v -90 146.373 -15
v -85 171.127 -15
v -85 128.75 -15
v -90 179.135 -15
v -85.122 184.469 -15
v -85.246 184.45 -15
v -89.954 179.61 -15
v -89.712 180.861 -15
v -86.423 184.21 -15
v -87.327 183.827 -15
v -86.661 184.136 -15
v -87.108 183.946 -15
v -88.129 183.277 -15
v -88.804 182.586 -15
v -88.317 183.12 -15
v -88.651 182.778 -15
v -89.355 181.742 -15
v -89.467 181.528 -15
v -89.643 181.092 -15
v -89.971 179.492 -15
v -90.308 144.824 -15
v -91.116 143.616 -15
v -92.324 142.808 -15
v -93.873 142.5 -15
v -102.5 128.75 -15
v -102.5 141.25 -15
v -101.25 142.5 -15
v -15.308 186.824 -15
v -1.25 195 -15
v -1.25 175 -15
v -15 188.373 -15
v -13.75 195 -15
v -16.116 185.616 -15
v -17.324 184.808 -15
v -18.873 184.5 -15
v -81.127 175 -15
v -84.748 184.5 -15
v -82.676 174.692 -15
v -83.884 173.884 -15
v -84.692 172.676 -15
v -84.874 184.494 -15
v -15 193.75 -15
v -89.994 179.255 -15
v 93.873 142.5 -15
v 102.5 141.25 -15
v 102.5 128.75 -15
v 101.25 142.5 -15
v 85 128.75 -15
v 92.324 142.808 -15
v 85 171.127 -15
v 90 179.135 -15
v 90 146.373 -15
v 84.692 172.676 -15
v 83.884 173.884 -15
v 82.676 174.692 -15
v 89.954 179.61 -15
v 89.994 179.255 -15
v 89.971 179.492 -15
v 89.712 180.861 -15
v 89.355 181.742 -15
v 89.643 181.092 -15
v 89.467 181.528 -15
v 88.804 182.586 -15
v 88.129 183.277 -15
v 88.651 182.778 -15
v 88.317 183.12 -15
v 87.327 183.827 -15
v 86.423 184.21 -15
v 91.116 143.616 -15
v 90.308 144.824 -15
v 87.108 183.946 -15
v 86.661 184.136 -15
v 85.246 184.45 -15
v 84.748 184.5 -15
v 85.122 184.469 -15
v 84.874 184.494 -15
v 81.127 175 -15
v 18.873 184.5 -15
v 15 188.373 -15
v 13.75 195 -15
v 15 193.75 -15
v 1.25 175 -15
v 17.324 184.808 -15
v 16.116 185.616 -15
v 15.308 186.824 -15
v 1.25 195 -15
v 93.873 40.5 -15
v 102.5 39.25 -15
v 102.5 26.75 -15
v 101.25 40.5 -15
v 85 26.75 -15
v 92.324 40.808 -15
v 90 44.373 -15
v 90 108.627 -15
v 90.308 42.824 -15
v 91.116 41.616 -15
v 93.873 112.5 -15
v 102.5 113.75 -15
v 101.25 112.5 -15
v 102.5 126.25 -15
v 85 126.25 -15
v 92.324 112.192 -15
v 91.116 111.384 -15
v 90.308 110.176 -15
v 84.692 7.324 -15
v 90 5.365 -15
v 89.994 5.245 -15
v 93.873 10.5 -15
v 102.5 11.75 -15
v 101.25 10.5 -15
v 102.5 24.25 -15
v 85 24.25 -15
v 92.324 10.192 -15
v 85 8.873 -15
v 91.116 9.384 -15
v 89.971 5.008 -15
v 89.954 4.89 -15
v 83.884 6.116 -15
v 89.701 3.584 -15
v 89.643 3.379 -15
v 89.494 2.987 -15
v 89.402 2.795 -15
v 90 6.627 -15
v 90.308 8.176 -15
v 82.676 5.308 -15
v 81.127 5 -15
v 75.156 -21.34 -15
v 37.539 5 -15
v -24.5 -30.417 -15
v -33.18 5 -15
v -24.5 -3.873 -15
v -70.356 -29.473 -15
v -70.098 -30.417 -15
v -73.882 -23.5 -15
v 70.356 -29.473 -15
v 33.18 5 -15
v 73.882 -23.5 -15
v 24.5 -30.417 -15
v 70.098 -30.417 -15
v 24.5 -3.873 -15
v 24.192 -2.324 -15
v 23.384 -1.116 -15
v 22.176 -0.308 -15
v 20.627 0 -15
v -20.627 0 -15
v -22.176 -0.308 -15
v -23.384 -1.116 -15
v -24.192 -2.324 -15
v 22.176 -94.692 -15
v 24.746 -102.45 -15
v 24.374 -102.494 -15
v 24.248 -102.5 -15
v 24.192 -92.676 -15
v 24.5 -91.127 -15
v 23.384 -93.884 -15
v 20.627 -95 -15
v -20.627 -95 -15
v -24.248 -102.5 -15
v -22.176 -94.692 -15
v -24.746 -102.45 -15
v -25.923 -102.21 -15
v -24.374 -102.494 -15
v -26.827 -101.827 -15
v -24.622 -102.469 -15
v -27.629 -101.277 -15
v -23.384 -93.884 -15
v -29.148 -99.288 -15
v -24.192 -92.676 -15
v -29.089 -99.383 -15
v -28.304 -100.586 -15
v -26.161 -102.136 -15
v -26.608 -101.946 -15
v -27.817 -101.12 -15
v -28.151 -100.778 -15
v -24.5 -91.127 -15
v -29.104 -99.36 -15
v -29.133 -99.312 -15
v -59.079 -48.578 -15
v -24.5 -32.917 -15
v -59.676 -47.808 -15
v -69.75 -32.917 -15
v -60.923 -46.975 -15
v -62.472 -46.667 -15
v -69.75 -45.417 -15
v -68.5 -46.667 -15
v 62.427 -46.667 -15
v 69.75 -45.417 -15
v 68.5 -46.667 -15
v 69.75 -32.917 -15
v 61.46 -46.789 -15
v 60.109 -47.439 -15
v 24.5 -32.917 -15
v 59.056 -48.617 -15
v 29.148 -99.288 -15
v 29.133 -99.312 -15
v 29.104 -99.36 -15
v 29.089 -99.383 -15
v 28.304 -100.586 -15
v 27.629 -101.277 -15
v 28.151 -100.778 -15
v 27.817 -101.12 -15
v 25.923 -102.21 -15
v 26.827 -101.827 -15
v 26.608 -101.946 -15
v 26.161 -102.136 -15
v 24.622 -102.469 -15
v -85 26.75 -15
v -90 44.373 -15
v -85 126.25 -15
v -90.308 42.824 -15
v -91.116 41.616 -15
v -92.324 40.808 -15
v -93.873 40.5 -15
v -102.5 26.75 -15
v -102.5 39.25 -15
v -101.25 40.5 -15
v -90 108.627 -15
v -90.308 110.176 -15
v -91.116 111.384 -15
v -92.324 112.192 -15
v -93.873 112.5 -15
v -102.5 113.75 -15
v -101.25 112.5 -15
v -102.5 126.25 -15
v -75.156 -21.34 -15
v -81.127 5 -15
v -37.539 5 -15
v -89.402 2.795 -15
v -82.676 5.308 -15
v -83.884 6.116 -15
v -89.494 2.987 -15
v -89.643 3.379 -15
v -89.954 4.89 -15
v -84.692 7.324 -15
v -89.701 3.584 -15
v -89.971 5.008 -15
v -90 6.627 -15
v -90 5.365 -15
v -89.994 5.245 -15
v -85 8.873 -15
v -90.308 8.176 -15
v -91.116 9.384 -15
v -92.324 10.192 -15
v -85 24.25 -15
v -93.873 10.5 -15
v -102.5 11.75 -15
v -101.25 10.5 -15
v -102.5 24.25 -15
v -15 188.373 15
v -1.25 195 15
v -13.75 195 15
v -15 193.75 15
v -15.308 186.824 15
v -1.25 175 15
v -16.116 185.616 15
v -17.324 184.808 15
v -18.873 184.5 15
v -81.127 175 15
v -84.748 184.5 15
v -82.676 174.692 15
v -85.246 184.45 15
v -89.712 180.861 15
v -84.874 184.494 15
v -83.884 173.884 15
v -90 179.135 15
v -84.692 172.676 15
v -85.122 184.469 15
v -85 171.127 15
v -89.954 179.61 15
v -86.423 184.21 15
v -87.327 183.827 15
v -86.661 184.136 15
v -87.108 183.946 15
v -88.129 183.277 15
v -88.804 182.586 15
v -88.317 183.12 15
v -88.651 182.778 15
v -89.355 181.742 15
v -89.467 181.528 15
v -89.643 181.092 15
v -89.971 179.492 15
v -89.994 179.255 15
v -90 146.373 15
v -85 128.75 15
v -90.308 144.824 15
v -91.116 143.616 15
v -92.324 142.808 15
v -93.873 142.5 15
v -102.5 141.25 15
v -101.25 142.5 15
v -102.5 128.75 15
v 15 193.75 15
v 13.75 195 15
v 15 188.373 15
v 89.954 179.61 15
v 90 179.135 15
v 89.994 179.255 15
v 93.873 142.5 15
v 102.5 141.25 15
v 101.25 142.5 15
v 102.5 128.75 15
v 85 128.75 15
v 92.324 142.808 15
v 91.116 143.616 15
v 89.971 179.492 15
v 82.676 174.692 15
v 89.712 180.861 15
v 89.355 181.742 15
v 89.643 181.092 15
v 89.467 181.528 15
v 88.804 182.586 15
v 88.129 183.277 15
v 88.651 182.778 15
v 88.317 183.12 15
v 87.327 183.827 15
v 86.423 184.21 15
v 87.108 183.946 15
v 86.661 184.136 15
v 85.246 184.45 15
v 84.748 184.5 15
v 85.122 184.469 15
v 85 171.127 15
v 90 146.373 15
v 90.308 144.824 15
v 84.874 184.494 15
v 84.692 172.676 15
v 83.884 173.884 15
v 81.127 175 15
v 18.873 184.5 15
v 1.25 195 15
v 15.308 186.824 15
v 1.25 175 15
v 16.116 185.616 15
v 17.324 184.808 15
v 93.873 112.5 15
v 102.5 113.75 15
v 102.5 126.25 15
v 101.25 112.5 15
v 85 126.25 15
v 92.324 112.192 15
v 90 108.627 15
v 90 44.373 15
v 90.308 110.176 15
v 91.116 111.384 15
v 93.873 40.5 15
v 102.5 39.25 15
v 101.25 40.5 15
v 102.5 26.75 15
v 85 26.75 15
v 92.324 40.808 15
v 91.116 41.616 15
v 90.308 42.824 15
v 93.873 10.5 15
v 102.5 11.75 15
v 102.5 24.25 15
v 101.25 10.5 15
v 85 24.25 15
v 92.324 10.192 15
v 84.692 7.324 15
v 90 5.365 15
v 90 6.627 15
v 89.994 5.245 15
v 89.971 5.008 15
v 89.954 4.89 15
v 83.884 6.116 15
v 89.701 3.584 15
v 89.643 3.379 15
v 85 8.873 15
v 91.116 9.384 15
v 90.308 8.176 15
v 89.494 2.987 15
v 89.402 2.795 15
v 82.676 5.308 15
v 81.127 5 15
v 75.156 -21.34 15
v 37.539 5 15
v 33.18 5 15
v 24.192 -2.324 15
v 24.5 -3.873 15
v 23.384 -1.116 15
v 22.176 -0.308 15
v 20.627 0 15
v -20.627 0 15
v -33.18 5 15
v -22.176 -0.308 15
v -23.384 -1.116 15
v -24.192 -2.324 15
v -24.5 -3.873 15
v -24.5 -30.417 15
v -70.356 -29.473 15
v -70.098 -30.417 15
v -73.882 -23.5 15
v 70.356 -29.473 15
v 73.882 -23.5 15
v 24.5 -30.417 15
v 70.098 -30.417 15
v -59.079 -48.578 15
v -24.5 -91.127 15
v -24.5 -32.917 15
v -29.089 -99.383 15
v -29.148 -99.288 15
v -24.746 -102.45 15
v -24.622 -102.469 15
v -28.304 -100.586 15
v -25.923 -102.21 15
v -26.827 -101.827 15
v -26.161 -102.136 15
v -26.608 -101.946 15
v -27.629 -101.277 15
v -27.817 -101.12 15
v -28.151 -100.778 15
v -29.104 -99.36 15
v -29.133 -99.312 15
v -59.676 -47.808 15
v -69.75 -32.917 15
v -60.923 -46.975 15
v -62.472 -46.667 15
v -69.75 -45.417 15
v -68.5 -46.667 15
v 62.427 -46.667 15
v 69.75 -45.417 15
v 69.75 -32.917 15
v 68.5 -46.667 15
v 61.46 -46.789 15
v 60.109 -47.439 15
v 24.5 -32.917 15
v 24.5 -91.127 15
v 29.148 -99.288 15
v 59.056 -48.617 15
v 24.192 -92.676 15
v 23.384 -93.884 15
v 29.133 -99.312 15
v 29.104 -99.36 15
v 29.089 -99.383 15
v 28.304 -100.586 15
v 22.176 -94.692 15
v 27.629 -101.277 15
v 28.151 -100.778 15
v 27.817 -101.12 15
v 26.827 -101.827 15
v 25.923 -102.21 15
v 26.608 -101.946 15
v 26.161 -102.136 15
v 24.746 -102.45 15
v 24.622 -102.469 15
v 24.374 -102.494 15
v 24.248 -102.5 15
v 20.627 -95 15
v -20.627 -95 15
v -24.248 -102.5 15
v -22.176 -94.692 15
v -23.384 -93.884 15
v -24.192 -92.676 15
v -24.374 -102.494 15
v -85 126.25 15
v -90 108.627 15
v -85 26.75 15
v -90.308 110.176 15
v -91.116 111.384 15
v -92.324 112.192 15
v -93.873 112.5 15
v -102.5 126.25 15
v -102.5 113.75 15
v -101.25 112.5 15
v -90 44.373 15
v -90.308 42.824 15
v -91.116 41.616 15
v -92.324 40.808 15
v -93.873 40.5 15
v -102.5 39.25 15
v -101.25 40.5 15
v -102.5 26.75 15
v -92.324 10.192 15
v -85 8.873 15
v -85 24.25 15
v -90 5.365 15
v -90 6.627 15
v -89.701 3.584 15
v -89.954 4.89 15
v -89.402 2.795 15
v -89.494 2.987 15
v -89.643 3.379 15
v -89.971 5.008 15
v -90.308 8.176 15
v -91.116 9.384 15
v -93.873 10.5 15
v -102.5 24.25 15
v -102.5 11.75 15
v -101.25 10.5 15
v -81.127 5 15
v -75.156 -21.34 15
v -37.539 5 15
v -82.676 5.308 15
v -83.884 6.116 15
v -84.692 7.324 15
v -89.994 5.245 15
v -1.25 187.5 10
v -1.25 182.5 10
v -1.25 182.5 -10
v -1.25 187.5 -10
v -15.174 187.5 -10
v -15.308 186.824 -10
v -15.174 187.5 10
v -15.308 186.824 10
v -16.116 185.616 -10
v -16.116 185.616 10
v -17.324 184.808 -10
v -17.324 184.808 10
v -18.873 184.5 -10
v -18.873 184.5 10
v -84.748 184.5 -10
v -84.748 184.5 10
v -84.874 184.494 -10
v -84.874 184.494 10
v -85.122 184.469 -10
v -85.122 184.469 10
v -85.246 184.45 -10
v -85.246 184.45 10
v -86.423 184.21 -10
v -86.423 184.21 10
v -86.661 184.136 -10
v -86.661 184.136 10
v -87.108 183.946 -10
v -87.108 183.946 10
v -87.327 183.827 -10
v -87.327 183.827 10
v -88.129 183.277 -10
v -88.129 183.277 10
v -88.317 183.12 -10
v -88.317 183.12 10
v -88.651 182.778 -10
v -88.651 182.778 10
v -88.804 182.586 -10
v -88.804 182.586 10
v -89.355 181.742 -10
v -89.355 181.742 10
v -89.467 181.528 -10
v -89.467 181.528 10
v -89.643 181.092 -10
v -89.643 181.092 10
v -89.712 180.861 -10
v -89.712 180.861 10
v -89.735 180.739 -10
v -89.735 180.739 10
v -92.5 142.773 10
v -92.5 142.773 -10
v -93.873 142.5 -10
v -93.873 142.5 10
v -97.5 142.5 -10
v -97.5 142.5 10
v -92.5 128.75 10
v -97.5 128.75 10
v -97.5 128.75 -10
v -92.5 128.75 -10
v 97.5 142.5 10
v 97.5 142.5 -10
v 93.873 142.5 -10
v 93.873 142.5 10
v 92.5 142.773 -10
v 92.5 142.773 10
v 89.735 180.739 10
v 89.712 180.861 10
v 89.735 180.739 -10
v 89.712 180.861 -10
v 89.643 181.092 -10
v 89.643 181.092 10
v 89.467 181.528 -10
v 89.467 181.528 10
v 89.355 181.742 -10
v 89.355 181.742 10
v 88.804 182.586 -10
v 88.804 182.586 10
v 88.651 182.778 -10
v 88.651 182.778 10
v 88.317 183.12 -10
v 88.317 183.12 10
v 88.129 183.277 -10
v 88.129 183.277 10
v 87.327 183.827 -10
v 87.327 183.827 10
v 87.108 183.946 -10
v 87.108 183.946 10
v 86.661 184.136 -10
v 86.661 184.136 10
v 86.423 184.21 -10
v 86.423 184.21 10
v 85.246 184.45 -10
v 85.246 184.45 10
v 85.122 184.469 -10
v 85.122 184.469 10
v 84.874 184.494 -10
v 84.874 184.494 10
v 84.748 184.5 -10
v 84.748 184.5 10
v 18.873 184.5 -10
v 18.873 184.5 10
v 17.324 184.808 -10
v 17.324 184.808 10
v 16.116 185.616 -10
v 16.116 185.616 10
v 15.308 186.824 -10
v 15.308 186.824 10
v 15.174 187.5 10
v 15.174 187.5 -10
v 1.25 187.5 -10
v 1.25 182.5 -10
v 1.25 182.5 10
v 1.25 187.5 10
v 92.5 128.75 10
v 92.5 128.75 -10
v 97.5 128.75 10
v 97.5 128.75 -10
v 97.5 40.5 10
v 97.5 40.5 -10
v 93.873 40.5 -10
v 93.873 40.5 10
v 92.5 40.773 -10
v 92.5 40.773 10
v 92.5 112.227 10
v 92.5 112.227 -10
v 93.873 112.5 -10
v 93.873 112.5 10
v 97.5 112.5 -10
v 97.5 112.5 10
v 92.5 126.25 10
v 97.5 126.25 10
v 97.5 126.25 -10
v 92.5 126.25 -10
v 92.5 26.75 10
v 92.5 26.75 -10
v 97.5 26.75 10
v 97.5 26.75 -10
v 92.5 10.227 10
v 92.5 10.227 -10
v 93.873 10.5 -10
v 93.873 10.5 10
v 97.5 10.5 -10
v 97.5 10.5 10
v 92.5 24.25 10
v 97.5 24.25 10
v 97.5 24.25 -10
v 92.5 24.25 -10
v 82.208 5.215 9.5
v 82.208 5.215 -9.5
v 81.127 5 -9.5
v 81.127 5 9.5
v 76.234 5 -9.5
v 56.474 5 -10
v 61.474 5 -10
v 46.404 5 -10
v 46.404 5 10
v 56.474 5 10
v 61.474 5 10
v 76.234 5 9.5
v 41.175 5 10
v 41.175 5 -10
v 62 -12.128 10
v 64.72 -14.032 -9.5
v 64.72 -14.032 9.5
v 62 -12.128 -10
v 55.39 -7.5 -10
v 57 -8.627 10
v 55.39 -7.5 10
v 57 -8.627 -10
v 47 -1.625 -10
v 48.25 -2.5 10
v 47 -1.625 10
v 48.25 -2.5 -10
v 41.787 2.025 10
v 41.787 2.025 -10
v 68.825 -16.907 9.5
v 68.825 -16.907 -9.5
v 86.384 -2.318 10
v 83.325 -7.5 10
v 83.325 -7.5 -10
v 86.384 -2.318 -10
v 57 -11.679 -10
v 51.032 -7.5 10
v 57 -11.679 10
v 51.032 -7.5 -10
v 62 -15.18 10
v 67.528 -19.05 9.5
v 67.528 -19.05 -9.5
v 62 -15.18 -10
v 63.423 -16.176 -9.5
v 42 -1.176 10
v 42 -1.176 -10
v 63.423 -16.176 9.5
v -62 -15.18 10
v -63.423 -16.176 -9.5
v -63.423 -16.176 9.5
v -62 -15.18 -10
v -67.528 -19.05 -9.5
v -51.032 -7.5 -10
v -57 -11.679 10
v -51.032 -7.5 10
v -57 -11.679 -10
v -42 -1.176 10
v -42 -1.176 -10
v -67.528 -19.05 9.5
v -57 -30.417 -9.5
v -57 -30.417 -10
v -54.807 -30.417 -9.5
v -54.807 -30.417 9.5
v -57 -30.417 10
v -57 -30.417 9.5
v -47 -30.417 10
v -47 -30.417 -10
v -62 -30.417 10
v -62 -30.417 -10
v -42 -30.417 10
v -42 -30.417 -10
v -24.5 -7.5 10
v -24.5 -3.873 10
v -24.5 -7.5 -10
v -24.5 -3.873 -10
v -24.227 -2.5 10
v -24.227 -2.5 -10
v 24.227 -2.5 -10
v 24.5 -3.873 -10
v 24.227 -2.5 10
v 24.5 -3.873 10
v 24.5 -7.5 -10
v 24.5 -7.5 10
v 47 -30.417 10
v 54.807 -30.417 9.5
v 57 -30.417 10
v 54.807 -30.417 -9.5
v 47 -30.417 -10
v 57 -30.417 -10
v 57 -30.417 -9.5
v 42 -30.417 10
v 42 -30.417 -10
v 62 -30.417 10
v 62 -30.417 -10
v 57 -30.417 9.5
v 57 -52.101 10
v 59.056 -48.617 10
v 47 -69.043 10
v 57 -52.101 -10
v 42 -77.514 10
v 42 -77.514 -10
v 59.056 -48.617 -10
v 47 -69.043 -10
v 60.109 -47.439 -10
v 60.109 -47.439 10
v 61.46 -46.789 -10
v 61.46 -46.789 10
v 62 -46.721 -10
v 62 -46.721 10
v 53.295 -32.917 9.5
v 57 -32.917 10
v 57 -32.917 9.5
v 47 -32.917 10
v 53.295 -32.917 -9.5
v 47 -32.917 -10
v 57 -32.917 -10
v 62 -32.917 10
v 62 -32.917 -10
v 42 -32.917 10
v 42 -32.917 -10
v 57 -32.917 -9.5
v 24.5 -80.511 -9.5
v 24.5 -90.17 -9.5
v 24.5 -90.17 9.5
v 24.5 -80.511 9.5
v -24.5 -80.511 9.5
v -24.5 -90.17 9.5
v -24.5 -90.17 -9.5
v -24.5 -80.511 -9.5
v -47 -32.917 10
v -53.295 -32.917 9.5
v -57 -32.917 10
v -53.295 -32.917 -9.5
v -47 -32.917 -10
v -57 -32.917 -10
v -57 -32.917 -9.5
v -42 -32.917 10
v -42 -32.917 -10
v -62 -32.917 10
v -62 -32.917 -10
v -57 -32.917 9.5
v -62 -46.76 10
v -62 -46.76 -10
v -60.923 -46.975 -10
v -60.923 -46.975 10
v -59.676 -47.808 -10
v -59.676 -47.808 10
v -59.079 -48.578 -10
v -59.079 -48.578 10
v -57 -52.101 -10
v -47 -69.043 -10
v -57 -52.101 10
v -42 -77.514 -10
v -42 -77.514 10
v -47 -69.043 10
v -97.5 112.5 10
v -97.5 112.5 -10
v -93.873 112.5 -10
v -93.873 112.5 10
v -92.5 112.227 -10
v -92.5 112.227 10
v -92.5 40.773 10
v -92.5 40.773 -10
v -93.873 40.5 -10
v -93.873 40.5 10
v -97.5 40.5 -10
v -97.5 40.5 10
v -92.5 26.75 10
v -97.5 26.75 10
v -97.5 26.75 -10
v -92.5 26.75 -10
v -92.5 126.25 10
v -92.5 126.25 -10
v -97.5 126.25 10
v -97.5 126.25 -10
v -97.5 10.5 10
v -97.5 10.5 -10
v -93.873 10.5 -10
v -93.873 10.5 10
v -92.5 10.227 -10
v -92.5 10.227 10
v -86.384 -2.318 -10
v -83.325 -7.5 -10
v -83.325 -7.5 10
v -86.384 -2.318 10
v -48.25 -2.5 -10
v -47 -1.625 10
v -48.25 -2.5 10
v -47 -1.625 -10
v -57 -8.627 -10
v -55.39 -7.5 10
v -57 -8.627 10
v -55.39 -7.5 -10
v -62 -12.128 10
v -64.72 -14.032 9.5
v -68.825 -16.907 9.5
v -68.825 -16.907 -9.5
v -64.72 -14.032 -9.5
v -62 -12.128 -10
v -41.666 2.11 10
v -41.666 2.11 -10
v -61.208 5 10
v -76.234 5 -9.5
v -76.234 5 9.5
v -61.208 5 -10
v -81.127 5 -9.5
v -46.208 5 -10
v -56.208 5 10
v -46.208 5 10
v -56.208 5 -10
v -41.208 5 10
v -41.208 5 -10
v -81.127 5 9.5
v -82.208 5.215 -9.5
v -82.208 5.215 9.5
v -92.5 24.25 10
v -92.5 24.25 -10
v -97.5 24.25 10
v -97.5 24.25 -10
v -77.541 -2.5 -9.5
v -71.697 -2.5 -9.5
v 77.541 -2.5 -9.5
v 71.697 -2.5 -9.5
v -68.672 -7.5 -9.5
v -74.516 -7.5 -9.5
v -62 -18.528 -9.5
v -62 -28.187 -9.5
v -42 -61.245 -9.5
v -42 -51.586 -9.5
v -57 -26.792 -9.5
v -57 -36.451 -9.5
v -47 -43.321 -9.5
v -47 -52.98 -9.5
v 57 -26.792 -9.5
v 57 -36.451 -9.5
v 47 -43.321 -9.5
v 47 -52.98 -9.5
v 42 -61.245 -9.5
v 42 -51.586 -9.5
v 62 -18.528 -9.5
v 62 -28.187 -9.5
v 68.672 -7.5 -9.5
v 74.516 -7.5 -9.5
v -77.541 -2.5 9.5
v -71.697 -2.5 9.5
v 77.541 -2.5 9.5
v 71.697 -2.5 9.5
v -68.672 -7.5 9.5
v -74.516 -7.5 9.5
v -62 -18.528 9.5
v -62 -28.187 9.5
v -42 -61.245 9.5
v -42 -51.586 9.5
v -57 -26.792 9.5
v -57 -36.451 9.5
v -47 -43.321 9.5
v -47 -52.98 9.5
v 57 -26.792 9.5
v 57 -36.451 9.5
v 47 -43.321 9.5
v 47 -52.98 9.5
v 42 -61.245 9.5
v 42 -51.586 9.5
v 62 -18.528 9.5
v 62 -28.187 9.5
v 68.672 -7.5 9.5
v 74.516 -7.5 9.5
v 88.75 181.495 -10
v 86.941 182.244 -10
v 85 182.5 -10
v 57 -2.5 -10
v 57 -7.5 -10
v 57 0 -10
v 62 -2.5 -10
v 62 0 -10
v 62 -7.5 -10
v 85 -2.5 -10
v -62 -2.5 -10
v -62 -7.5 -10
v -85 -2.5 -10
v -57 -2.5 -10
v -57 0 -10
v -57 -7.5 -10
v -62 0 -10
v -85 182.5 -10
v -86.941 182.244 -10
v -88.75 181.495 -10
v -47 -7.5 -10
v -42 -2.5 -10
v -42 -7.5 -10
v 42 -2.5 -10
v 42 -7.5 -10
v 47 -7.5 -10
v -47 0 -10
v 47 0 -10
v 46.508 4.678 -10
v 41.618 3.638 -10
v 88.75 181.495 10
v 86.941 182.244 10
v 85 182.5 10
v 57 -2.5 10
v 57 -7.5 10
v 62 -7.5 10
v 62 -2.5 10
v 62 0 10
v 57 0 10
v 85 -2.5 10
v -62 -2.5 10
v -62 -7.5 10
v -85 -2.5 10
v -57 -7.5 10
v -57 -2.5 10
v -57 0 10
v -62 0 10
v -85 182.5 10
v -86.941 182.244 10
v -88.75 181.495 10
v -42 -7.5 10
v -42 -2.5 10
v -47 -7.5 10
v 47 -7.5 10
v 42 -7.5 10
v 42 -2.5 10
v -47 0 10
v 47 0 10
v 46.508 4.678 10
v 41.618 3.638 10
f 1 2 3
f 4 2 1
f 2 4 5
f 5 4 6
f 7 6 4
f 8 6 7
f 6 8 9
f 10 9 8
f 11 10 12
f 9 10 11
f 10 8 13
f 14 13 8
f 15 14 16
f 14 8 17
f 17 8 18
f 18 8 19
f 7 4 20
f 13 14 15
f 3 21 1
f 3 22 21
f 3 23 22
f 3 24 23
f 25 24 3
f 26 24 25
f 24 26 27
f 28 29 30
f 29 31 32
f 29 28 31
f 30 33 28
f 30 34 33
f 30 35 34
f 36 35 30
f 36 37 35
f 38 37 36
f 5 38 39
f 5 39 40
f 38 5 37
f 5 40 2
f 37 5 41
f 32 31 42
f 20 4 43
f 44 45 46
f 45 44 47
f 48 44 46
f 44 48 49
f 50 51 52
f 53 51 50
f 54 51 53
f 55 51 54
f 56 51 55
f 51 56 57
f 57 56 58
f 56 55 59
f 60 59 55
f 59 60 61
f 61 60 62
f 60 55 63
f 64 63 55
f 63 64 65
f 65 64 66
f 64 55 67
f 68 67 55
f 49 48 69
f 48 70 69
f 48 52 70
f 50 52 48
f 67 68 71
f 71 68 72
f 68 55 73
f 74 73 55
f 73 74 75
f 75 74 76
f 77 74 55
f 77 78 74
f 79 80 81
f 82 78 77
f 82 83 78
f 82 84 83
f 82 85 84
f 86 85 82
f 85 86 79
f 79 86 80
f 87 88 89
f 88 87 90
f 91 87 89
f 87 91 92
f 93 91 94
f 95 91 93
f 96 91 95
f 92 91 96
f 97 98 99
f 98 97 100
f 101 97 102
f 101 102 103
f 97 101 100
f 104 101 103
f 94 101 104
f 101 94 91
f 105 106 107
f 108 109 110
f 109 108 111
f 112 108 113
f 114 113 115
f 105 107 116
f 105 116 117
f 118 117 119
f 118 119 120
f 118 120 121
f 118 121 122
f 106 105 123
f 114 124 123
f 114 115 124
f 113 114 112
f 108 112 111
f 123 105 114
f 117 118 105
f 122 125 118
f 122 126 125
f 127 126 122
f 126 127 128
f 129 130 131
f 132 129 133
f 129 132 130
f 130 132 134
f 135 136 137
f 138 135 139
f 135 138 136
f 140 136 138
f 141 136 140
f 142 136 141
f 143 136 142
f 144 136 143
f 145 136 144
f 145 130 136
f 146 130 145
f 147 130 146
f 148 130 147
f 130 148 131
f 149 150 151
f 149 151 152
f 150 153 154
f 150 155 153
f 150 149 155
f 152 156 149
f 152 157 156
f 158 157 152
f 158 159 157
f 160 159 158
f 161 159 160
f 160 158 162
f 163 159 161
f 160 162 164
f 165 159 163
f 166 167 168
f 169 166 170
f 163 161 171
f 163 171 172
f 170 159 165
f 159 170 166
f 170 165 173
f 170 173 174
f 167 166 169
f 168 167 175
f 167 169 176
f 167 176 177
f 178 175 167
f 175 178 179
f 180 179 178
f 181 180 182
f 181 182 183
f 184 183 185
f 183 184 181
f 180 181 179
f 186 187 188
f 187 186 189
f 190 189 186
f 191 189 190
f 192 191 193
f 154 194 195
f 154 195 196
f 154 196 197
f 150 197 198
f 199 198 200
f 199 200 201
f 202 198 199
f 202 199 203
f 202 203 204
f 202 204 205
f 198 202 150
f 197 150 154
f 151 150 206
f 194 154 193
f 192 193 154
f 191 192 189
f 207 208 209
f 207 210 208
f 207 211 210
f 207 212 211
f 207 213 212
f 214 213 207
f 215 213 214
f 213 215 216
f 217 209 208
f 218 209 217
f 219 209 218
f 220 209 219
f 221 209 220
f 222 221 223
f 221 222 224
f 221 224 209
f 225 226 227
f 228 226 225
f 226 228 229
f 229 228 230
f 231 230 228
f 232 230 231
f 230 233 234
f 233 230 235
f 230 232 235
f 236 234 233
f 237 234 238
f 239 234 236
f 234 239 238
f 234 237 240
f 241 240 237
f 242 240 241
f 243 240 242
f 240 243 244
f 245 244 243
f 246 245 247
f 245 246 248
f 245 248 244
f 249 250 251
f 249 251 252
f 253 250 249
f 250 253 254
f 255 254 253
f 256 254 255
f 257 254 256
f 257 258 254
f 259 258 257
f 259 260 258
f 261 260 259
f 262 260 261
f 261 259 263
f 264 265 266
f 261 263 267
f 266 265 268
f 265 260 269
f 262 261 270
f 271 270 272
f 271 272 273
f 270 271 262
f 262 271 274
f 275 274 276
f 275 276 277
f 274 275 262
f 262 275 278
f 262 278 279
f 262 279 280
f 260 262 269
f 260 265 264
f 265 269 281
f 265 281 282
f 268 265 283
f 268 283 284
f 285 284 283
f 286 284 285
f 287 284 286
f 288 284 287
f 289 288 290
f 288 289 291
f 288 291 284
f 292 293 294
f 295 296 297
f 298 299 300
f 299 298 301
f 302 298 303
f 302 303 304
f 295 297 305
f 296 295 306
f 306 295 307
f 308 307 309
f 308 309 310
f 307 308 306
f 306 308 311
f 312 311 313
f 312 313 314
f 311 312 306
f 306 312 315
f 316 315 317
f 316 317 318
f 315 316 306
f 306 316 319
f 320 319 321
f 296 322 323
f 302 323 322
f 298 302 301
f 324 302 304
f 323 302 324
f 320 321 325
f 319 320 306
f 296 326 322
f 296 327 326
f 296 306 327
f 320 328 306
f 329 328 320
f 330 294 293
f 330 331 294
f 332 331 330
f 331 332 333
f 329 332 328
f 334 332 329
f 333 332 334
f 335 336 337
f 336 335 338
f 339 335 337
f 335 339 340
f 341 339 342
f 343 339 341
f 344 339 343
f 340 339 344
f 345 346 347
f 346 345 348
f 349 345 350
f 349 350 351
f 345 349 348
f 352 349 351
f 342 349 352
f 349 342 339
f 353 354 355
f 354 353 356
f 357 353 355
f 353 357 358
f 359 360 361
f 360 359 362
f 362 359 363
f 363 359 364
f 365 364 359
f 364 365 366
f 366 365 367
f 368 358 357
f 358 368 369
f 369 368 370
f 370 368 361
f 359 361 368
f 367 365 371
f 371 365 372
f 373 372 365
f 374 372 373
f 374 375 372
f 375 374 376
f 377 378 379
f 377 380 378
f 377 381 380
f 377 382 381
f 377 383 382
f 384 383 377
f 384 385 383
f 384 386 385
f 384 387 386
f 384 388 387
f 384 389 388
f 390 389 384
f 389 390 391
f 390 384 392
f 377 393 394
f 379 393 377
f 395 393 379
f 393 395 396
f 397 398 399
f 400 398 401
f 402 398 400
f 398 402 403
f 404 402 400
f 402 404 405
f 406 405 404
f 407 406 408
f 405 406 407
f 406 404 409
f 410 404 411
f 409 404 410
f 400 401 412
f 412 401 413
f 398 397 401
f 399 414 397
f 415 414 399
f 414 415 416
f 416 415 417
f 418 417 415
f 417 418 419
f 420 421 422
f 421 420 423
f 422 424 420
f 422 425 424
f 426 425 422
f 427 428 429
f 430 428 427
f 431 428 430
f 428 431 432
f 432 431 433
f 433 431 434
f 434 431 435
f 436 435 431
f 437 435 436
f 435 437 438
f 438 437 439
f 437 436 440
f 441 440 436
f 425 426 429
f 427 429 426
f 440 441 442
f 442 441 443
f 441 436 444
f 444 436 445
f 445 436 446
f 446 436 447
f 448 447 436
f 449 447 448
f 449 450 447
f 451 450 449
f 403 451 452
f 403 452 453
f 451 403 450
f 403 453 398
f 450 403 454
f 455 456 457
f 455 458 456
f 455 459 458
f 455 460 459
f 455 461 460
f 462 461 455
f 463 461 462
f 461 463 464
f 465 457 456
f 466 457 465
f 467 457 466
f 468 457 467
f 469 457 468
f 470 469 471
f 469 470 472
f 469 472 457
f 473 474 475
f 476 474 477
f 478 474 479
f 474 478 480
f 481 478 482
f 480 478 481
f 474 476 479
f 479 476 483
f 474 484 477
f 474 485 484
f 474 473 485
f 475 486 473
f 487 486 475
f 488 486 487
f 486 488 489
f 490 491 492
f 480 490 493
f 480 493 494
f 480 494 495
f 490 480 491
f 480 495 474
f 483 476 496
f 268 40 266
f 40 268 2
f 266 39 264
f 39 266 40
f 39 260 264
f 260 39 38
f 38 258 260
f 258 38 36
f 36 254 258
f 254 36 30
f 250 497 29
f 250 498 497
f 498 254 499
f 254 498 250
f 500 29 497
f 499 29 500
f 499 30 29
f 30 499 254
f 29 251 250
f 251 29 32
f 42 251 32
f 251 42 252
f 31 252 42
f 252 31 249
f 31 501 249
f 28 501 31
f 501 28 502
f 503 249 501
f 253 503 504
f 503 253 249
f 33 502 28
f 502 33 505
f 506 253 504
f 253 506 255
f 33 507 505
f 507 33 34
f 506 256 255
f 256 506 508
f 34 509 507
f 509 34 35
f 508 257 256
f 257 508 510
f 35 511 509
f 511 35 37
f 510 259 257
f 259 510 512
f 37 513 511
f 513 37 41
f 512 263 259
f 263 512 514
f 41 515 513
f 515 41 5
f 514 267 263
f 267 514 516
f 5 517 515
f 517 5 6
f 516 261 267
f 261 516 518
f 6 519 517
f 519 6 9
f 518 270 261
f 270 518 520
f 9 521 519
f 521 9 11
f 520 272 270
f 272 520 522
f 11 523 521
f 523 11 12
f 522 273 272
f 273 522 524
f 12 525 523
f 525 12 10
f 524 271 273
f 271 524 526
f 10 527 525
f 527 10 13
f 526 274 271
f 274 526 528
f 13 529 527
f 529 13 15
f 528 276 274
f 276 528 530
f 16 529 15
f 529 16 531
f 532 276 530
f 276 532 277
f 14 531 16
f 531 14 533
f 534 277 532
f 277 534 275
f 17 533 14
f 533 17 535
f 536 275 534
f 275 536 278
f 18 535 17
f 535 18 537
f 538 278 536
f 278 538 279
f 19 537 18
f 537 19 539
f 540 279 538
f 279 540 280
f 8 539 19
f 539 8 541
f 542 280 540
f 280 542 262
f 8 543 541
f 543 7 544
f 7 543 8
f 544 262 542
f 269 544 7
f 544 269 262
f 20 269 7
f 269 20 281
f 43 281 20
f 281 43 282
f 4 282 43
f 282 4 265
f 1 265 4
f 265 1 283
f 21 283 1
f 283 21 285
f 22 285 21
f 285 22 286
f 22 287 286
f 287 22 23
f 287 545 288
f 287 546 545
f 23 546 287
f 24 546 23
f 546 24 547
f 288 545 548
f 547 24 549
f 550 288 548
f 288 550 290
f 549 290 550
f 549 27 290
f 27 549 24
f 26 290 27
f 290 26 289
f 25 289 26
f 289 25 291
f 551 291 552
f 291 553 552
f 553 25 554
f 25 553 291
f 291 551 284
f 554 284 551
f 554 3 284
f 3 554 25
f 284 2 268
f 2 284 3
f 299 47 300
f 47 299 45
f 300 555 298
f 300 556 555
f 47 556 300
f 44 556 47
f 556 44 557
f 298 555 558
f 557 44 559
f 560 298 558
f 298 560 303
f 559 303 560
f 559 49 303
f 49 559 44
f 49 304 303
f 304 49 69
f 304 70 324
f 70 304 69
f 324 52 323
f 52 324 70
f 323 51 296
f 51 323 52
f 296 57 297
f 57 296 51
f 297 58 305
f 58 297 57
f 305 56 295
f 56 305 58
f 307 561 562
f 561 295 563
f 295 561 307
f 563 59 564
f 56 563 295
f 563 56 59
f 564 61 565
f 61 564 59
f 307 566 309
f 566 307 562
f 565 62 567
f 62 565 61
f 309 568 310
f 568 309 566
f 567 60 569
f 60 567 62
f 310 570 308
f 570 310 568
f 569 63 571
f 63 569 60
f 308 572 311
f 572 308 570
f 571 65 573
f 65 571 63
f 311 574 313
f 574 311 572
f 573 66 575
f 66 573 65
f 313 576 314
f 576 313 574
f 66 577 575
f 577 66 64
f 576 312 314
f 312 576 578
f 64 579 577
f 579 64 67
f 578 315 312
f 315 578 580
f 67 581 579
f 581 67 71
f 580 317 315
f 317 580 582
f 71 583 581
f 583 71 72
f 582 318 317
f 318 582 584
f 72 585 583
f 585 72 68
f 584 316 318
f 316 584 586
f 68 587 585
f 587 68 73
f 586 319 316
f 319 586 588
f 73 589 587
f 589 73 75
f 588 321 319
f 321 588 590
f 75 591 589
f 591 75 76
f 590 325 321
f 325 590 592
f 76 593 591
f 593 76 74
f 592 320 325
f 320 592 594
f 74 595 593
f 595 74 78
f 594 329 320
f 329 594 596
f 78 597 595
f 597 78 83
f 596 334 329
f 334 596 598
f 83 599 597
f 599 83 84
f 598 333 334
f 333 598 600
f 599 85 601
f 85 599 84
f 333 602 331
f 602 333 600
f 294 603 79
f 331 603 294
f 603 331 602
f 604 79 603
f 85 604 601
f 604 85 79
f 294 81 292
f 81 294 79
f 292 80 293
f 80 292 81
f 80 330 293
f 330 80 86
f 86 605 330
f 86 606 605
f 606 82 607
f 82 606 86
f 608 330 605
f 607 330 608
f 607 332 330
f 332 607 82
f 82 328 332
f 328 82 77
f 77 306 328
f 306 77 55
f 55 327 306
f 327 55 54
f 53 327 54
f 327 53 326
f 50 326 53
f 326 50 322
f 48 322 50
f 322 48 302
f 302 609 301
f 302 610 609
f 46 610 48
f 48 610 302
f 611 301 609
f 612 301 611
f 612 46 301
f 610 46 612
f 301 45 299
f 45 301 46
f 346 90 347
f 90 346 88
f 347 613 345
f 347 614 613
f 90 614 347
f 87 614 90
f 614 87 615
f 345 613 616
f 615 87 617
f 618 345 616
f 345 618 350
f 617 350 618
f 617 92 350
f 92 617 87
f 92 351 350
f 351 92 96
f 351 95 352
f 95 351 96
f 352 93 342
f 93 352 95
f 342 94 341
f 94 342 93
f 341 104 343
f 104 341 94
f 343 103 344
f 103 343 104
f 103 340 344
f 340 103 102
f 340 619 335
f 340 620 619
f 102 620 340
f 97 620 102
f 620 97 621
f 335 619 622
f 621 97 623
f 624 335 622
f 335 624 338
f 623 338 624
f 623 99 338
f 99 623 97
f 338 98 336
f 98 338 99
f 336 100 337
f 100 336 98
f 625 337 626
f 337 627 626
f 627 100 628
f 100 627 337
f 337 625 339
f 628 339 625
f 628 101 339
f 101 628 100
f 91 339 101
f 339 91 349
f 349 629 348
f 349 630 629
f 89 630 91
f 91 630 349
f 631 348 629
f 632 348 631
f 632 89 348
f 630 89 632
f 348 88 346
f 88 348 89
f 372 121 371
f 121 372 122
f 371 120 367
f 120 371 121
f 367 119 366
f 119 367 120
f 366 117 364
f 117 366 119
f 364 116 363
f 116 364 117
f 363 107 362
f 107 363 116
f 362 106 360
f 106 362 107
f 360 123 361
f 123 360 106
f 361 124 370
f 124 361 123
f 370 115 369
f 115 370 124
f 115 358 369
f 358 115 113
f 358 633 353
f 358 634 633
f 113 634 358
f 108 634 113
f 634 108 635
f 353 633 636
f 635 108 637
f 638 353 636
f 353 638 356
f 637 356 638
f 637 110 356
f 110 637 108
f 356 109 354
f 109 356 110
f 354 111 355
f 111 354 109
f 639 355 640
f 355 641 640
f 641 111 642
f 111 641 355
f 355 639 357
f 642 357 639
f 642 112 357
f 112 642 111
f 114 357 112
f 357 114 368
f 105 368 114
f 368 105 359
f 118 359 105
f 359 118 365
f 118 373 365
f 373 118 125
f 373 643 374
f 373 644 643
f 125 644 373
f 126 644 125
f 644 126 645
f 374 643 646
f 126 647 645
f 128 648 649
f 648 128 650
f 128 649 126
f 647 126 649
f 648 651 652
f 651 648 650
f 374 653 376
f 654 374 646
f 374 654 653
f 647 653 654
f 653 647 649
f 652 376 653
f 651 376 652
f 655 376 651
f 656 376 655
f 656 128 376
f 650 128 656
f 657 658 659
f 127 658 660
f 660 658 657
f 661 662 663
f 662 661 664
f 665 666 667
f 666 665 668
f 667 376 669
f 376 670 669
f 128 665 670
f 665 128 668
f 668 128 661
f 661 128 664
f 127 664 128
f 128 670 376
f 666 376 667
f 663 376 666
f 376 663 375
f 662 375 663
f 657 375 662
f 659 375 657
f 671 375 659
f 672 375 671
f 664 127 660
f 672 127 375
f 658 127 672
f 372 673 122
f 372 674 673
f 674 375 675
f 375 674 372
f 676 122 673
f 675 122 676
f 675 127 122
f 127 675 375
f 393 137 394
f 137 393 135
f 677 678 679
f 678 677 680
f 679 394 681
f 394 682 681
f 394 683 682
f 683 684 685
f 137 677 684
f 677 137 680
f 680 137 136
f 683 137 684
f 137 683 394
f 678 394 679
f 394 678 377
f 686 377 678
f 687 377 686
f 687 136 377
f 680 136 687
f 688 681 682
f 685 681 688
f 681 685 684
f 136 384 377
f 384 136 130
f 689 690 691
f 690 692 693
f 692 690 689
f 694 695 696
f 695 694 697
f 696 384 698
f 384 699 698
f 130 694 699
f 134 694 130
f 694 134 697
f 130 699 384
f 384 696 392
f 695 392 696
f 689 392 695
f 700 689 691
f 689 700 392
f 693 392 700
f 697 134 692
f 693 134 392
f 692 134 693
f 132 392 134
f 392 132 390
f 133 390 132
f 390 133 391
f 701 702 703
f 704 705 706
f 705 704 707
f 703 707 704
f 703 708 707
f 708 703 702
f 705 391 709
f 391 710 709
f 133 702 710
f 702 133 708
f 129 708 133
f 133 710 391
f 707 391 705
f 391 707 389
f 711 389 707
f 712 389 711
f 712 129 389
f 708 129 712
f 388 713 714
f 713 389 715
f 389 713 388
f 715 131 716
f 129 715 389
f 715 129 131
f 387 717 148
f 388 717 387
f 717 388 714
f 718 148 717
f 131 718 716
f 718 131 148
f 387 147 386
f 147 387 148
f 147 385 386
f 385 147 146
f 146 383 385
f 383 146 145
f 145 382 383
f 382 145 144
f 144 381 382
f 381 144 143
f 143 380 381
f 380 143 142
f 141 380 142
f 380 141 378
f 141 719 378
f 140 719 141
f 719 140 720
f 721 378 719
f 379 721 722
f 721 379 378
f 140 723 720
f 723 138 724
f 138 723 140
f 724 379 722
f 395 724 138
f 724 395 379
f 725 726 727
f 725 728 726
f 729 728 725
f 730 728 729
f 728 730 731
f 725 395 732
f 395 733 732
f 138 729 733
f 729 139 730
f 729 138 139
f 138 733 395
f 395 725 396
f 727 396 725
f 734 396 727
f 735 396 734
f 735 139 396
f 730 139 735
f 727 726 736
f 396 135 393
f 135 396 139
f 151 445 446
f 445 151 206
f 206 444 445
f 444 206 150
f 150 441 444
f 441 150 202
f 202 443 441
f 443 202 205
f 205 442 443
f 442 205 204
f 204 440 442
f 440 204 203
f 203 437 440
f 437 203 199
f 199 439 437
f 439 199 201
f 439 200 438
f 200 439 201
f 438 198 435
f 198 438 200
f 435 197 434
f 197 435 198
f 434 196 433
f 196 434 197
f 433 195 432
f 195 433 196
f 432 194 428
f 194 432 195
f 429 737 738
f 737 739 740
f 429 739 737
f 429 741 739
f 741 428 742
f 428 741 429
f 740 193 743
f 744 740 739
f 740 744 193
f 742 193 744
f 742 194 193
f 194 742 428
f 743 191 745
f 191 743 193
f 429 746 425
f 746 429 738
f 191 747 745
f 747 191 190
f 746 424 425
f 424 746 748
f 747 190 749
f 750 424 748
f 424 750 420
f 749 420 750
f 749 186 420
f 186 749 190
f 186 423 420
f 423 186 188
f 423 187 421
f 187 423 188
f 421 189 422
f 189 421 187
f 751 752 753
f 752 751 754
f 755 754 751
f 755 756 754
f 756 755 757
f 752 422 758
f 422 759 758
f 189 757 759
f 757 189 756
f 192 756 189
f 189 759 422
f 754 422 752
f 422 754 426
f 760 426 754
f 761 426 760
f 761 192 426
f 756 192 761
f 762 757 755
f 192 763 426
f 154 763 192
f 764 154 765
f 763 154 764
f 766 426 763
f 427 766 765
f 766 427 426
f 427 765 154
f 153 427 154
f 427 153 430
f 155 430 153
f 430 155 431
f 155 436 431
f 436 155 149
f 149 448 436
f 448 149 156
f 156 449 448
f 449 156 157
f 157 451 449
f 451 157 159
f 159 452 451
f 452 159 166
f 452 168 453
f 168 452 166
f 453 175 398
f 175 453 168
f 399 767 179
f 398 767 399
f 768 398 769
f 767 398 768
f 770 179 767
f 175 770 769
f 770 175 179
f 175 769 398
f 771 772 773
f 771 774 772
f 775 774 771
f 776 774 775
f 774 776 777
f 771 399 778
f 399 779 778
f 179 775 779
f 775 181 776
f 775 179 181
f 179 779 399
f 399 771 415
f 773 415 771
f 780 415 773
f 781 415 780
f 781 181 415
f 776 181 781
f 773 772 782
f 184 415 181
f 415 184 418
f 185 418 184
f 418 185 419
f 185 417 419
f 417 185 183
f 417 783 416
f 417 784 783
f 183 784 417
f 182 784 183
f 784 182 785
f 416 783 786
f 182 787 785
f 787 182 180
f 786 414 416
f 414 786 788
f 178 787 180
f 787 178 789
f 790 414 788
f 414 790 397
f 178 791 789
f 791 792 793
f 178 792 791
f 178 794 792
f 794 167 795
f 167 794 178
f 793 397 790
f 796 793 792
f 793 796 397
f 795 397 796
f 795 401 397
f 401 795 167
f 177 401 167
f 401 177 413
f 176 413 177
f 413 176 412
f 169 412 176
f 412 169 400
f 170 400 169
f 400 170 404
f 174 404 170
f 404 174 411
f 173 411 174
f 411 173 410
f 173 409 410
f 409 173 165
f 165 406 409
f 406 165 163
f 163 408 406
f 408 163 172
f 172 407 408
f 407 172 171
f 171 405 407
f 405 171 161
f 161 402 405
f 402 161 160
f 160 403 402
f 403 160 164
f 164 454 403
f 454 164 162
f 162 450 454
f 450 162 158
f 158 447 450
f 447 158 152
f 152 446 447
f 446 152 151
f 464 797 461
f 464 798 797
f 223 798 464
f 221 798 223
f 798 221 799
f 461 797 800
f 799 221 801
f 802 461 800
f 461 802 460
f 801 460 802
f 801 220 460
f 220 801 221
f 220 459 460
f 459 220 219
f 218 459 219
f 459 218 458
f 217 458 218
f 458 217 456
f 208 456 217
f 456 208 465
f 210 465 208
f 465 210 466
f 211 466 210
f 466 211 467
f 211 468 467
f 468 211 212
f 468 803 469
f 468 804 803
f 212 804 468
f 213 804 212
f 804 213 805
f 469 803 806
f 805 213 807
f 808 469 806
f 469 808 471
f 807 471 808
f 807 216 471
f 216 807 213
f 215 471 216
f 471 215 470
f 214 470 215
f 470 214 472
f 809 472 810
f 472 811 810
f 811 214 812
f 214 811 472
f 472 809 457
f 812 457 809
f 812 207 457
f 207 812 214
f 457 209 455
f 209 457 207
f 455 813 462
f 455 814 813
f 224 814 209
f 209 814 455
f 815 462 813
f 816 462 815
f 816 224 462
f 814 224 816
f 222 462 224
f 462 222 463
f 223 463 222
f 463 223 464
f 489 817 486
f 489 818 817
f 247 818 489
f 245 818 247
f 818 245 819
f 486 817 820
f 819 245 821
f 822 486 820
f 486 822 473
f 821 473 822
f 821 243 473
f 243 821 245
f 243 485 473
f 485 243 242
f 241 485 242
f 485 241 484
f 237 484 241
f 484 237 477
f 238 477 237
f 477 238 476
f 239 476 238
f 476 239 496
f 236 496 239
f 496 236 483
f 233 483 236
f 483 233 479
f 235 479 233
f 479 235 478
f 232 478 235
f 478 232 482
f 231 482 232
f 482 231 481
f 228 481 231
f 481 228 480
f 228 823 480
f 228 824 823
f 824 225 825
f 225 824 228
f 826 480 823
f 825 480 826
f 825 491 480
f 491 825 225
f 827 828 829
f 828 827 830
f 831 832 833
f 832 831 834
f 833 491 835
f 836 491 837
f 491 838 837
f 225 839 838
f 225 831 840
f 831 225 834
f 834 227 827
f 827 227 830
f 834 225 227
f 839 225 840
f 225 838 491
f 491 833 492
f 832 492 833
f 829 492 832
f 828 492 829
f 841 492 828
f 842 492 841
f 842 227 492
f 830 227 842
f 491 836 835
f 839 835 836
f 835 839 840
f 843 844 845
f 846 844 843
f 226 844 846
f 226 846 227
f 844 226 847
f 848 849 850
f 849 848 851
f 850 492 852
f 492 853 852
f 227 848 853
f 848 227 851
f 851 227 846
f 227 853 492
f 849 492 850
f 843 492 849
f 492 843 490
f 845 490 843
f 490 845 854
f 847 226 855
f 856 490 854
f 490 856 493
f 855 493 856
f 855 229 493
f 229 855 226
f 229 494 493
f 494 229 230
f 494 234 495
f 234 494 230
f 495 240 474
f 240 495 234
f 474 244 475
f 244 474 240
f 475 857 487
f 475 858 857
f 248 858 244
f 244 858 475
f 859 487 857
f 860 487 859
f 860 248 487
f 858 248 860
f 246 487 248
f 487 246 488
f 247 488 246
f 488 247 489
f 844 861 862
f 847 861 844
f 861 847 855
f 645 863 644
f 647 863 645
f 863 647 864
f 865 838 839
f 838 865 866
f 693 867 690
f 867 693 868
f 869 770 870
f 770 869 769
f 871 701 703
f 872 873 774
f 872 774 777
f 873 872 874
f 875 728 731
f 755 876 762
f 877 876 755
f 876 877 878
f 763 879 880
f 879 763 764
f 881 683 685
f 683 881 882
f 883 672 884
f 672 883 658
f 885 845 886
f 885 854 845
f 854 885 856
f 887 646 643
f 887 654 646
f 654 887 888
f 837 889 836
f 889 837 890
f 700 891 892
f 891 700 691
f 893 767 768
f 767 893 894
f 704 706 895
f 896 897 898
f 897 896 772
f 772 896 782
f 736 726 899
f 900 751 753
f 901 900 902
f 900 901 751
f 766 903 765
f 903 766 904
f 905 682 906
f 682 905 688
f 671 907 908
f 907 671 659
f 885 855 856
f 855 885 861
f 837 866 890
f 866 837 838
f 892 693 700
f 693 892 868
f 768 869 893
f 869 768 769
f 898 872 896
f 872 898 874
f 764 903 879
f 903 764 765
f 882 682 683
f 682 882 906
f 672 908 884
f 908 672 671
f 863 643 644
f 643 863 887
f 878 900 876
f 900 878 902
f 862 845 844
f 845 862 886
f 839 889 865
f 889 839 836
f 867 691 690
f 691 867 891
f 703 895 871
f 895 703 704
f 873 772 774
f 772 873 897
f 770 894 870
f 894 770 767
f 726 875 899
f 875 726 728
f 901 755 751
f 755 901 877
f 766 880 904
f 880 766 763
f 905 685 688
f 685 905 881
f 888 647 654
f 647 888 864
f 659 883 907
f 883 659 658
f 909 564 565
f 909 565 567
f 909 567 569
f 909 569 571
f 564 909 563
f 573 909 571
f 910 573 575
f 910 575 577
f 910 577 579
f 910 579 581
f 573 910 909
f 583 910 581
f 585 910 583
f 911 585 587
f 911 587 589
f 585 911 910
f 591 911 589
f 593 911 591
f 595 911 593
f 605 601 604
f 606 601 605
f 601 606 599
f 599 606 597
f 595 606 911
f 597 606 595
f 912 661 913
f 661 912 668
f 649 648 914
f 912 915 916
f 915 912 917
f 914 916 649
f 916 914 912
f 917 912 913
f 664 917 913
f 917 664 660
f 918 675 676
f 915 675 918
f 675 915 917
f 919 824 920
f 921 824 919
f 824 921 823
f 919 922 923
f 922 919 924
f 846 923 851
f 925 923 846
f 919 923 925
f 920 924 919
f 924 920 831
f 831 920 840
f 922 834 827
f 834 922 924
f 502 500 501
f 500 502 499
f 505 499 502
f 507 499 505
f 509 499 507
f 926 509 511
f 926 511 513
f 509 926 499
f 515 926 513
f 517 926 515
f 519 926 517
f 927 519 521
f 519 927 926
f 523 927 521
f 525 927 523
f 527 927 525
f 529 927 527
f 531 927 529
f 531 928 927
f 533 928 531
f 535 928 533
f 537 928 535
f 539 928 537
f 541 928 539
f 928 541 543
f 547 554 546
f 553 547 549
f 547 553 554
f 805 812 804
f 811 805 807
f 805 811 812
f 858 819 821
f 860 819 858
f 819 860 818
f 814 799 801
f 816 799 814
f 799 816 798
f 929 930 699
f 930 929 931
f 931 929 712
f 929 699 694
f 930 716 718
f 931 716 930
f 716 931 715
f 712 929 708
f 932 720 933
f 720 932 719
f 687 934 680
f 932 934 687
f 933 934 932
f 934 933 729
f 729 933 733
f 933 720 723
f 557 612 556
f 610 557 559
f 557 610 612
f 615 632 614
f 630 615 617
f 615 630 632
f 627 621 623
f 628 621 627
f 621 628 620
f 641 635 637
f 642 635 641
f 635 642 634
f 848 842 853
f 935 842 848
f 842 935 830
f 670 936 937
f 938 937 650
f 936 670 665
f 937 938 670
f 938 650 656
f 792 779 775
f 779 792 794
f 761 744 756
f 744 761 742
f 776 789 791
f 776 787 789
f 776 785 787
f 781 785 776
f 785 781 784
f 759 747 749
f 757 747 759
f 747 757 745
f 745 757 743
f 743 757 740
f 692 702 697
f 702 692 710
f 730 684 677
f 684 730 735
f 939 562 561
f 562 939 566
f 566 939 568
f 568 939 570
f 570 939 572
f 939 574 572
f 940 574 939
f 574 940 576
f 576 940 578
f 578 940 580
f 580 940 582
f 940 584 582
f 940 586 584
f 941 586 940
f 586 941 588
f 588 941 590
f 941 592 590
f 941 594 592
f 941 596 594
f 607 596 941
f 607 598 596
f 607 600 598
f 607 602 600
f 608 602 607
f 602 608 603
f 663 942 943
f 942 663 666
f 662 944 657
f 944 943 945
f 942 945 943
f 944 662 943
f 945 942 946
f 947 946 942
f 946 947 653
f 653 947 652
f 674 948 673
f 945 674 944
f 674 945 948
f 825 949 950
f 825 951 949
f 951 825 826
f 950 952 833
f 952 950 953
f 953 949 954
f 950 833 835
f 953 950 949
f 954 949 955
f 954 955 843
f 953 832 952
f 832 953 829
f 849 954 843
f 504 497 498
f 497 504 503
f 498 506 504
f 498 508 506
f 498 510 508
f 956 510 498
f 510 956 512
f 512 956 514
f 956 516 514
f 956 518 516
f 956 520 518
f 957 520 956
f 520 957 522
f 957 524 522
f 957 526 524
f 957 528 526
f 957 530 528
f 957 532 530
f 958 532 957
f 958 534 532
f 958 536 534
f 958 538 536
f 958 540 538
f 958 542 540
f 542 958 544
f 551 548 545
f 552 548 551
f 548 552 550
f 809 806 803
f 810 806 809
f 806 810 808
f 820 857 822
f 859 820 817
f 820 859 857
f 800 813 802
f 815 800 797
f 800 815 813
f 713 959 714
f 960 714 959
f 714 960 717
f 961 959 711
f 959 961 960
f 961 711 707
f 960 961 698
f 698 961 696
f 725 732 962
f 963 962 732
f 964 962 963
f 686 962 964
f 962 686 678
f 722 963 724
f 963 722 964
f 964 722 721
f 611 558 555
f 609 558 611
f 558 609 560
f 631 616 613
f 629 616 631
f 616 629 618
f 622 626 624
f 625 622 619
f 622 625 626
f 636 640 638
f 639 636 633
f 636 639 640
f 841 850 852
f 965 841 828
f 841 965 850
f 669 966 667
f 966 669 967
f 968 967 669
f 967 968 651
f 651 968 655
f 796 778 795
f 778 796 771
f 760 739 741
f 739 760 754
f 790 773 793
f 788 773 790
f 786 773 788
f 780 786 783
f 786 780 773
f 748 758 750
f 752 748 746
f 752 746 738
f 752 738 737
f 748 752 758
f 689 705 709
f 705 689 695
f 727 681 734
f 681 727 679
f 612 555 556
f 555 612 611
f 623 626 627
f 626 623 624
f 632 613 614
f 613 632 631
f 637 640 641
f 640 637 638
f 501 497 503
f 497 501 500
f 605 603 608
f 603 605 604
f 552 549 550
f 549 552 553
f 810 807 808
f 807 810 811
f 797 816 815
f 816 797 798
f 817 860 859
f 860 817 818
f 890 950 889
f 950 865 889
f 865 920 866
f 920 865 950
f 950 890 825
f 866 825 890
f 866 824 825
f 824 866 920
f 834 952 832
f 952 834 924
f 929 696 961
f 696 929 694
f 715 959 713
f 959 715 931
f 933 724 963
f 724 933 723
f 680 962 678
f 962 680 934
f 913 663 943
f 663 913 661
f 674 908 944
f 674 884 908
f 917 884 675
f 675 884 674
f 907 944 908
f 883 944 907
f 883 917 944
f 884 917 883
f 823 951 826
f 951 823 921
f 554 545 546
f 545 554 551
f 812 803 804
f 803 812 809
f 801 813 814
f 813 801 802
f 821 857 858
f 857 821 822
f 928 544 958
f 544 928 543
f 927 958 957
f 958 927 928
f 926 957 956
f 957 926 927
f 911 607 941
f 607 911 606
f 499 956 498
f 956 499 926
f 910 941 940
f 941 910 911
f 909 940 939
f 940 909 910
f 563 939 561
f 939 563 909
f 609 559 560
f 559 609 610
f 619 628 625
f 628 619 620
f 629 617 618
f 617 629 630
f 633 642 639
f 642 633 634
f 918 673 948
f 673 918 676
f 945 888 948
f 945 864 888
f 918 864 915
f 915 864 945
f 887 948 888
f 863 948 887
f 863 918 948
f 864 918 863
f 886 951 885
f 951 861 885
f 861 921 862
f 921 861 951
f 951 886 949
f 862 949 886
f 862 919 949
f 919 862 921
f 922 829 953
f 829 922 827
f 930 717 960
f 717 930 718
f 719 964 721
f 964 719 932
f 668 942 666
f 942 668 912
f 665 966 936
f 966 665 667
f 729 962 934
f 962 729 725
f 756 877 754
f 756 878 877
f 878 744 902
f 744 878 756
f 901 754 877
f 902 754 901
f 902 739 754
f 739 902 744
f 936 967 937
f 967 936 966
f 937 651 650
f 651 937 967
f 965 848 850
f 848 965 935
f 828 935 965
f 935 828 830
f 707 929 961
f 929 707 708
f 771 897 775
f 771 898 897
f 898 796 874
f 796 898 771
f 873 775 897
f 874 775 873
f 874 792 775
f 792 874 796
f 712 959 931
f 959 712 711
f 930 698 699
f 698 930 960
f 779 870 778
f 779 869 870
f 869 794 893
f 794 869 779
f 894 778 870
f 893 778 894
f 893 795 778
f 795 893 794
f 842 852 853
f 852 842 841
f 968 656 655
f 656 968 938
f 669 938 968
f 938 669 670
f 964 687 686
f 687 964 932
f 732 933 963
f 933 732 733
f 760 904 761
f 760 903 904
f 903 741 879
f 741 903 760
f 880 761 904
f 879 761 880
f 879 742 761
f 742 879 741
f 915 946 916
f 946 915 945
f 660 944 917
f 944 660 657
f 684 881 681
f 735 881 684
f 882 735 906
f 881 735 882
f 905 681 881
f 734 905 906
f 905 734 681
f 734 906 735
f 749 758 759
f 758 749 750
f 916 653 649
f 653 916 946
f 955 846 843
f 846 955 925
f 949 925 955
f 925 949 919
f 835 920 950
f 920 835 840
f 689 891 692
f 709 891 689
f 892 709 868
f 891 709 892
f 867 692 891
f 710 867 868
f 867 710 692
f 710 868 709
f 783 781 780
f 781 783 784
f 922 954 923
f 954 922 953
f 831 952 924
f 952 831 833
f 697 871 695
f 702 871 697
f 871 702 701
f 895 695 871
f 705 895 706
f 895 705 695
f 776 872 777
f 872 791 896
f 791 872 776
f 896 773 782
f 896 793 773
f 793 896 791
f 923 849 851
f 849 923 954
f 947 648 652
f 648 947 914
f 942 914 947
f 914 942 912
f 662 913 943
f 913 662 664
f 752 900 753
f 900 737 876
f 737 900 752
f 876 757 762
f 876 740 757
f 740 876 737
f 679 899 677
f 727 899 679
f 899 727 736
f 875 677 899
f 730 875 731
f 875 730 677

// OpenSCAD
gods=5;
lift=30;
battery=[170,170];
frame=[49,95];

difference(){

linear_extrude(lift,center=true,convexity=10)holder(); 
    //battery stripe
linear_extrude(lift-gods*2.2,center=true,convexity=10)
difference()
{
offset(-gods*.5 )
 hull() profile();

 offset(-gods*1.5 )
    
 hull() profile();

}
    
    
//battery stripe
linear_extrude(lift-gods*2,center=true,convexity=10)
difference()
{
offset(gods*2.5)
        translate([0,battery.y/2+gods])square(battery,true);

 offset(gods*1.5)
    
        translate([0,battery.y/2+gods])square(battery,true);

}

//innerbottom stripe
linear_extrude(lift-gods*2,center=true,convexity=10)
difference()
{
offset(gods*4.5)    
    translate([0,-frame.y/2])square(frame,true);
 offset(gods*3.5 )
      translate([0,-frame.y/2])square(frame,true);

}
//outerbottom stripe
linear_extrude(lift-gods*2,center=true,convexity=10)
difference()
{
offset(gods*7.5)    
    translate([0,-frame.y/2])square(frame,true);
 offset(gods*6.5 )
      translate([0,-frame.y/2])square(frame,true);

}
}
module profile(){
    translate([0,battery.y/2+gods])square(battery,true);
    
    translate([0,-frame.y/2])square(frame,true);
    
    }
    
    
    
    module holder(){
        
        

          difference(){
 offset(gods*.25) offset(-gods*1 ) offset(gods*.75)
     difference(){
   
    union(){
        // huvud kroppen
         hull()scale([1,1.025])offset(gods)profile();
    //nedre öron
      translate([0,-frame.y/3])  square([gods*6+(battery.x+frame.x)/2,gods*6],true);
   
   //övrree öron     
              translate([0,battery.y*.75])  square([gods*6+(battery.x+gods),gods*6],true);
        
        //mellan öron     
              translate([0,battery.y*.15])  square([gods*6+(battery.x+gods),gods*6],true);
                
        //top öron     
              translate([0,battery.y+gods*2 ]) rotate(90) square([gods*6 ,gods*6],true);
        }
    profile();
        

}
// nedre snitt
  translate([0,-frame.y/3])  square([ battery.x ,gods *0.5],true); 
// diagonala snitt
translate([battery.x*.25,0]) rotate(-35) square([ battery.x ,gods *0.5],true);
mirror([1,0,0])
translate([battery.x*.25,0]) rotate(-35) square([ battery.x ,gods *0.5],true);

//övre snitt
              translate([0,battery.y*.75])  square([gods*6+(battery.x+gods),gods*.5],true);
//mellan snitt
              translate([0,battery.y*.15])  square([gods*6+(battery.x+gods),gods*.5],true);
      //top öron snitt    
              translate([0,battery.y+gods*2 ]) rotate(90) square([gods*7 ,gods*.5],true);

        }
        }
